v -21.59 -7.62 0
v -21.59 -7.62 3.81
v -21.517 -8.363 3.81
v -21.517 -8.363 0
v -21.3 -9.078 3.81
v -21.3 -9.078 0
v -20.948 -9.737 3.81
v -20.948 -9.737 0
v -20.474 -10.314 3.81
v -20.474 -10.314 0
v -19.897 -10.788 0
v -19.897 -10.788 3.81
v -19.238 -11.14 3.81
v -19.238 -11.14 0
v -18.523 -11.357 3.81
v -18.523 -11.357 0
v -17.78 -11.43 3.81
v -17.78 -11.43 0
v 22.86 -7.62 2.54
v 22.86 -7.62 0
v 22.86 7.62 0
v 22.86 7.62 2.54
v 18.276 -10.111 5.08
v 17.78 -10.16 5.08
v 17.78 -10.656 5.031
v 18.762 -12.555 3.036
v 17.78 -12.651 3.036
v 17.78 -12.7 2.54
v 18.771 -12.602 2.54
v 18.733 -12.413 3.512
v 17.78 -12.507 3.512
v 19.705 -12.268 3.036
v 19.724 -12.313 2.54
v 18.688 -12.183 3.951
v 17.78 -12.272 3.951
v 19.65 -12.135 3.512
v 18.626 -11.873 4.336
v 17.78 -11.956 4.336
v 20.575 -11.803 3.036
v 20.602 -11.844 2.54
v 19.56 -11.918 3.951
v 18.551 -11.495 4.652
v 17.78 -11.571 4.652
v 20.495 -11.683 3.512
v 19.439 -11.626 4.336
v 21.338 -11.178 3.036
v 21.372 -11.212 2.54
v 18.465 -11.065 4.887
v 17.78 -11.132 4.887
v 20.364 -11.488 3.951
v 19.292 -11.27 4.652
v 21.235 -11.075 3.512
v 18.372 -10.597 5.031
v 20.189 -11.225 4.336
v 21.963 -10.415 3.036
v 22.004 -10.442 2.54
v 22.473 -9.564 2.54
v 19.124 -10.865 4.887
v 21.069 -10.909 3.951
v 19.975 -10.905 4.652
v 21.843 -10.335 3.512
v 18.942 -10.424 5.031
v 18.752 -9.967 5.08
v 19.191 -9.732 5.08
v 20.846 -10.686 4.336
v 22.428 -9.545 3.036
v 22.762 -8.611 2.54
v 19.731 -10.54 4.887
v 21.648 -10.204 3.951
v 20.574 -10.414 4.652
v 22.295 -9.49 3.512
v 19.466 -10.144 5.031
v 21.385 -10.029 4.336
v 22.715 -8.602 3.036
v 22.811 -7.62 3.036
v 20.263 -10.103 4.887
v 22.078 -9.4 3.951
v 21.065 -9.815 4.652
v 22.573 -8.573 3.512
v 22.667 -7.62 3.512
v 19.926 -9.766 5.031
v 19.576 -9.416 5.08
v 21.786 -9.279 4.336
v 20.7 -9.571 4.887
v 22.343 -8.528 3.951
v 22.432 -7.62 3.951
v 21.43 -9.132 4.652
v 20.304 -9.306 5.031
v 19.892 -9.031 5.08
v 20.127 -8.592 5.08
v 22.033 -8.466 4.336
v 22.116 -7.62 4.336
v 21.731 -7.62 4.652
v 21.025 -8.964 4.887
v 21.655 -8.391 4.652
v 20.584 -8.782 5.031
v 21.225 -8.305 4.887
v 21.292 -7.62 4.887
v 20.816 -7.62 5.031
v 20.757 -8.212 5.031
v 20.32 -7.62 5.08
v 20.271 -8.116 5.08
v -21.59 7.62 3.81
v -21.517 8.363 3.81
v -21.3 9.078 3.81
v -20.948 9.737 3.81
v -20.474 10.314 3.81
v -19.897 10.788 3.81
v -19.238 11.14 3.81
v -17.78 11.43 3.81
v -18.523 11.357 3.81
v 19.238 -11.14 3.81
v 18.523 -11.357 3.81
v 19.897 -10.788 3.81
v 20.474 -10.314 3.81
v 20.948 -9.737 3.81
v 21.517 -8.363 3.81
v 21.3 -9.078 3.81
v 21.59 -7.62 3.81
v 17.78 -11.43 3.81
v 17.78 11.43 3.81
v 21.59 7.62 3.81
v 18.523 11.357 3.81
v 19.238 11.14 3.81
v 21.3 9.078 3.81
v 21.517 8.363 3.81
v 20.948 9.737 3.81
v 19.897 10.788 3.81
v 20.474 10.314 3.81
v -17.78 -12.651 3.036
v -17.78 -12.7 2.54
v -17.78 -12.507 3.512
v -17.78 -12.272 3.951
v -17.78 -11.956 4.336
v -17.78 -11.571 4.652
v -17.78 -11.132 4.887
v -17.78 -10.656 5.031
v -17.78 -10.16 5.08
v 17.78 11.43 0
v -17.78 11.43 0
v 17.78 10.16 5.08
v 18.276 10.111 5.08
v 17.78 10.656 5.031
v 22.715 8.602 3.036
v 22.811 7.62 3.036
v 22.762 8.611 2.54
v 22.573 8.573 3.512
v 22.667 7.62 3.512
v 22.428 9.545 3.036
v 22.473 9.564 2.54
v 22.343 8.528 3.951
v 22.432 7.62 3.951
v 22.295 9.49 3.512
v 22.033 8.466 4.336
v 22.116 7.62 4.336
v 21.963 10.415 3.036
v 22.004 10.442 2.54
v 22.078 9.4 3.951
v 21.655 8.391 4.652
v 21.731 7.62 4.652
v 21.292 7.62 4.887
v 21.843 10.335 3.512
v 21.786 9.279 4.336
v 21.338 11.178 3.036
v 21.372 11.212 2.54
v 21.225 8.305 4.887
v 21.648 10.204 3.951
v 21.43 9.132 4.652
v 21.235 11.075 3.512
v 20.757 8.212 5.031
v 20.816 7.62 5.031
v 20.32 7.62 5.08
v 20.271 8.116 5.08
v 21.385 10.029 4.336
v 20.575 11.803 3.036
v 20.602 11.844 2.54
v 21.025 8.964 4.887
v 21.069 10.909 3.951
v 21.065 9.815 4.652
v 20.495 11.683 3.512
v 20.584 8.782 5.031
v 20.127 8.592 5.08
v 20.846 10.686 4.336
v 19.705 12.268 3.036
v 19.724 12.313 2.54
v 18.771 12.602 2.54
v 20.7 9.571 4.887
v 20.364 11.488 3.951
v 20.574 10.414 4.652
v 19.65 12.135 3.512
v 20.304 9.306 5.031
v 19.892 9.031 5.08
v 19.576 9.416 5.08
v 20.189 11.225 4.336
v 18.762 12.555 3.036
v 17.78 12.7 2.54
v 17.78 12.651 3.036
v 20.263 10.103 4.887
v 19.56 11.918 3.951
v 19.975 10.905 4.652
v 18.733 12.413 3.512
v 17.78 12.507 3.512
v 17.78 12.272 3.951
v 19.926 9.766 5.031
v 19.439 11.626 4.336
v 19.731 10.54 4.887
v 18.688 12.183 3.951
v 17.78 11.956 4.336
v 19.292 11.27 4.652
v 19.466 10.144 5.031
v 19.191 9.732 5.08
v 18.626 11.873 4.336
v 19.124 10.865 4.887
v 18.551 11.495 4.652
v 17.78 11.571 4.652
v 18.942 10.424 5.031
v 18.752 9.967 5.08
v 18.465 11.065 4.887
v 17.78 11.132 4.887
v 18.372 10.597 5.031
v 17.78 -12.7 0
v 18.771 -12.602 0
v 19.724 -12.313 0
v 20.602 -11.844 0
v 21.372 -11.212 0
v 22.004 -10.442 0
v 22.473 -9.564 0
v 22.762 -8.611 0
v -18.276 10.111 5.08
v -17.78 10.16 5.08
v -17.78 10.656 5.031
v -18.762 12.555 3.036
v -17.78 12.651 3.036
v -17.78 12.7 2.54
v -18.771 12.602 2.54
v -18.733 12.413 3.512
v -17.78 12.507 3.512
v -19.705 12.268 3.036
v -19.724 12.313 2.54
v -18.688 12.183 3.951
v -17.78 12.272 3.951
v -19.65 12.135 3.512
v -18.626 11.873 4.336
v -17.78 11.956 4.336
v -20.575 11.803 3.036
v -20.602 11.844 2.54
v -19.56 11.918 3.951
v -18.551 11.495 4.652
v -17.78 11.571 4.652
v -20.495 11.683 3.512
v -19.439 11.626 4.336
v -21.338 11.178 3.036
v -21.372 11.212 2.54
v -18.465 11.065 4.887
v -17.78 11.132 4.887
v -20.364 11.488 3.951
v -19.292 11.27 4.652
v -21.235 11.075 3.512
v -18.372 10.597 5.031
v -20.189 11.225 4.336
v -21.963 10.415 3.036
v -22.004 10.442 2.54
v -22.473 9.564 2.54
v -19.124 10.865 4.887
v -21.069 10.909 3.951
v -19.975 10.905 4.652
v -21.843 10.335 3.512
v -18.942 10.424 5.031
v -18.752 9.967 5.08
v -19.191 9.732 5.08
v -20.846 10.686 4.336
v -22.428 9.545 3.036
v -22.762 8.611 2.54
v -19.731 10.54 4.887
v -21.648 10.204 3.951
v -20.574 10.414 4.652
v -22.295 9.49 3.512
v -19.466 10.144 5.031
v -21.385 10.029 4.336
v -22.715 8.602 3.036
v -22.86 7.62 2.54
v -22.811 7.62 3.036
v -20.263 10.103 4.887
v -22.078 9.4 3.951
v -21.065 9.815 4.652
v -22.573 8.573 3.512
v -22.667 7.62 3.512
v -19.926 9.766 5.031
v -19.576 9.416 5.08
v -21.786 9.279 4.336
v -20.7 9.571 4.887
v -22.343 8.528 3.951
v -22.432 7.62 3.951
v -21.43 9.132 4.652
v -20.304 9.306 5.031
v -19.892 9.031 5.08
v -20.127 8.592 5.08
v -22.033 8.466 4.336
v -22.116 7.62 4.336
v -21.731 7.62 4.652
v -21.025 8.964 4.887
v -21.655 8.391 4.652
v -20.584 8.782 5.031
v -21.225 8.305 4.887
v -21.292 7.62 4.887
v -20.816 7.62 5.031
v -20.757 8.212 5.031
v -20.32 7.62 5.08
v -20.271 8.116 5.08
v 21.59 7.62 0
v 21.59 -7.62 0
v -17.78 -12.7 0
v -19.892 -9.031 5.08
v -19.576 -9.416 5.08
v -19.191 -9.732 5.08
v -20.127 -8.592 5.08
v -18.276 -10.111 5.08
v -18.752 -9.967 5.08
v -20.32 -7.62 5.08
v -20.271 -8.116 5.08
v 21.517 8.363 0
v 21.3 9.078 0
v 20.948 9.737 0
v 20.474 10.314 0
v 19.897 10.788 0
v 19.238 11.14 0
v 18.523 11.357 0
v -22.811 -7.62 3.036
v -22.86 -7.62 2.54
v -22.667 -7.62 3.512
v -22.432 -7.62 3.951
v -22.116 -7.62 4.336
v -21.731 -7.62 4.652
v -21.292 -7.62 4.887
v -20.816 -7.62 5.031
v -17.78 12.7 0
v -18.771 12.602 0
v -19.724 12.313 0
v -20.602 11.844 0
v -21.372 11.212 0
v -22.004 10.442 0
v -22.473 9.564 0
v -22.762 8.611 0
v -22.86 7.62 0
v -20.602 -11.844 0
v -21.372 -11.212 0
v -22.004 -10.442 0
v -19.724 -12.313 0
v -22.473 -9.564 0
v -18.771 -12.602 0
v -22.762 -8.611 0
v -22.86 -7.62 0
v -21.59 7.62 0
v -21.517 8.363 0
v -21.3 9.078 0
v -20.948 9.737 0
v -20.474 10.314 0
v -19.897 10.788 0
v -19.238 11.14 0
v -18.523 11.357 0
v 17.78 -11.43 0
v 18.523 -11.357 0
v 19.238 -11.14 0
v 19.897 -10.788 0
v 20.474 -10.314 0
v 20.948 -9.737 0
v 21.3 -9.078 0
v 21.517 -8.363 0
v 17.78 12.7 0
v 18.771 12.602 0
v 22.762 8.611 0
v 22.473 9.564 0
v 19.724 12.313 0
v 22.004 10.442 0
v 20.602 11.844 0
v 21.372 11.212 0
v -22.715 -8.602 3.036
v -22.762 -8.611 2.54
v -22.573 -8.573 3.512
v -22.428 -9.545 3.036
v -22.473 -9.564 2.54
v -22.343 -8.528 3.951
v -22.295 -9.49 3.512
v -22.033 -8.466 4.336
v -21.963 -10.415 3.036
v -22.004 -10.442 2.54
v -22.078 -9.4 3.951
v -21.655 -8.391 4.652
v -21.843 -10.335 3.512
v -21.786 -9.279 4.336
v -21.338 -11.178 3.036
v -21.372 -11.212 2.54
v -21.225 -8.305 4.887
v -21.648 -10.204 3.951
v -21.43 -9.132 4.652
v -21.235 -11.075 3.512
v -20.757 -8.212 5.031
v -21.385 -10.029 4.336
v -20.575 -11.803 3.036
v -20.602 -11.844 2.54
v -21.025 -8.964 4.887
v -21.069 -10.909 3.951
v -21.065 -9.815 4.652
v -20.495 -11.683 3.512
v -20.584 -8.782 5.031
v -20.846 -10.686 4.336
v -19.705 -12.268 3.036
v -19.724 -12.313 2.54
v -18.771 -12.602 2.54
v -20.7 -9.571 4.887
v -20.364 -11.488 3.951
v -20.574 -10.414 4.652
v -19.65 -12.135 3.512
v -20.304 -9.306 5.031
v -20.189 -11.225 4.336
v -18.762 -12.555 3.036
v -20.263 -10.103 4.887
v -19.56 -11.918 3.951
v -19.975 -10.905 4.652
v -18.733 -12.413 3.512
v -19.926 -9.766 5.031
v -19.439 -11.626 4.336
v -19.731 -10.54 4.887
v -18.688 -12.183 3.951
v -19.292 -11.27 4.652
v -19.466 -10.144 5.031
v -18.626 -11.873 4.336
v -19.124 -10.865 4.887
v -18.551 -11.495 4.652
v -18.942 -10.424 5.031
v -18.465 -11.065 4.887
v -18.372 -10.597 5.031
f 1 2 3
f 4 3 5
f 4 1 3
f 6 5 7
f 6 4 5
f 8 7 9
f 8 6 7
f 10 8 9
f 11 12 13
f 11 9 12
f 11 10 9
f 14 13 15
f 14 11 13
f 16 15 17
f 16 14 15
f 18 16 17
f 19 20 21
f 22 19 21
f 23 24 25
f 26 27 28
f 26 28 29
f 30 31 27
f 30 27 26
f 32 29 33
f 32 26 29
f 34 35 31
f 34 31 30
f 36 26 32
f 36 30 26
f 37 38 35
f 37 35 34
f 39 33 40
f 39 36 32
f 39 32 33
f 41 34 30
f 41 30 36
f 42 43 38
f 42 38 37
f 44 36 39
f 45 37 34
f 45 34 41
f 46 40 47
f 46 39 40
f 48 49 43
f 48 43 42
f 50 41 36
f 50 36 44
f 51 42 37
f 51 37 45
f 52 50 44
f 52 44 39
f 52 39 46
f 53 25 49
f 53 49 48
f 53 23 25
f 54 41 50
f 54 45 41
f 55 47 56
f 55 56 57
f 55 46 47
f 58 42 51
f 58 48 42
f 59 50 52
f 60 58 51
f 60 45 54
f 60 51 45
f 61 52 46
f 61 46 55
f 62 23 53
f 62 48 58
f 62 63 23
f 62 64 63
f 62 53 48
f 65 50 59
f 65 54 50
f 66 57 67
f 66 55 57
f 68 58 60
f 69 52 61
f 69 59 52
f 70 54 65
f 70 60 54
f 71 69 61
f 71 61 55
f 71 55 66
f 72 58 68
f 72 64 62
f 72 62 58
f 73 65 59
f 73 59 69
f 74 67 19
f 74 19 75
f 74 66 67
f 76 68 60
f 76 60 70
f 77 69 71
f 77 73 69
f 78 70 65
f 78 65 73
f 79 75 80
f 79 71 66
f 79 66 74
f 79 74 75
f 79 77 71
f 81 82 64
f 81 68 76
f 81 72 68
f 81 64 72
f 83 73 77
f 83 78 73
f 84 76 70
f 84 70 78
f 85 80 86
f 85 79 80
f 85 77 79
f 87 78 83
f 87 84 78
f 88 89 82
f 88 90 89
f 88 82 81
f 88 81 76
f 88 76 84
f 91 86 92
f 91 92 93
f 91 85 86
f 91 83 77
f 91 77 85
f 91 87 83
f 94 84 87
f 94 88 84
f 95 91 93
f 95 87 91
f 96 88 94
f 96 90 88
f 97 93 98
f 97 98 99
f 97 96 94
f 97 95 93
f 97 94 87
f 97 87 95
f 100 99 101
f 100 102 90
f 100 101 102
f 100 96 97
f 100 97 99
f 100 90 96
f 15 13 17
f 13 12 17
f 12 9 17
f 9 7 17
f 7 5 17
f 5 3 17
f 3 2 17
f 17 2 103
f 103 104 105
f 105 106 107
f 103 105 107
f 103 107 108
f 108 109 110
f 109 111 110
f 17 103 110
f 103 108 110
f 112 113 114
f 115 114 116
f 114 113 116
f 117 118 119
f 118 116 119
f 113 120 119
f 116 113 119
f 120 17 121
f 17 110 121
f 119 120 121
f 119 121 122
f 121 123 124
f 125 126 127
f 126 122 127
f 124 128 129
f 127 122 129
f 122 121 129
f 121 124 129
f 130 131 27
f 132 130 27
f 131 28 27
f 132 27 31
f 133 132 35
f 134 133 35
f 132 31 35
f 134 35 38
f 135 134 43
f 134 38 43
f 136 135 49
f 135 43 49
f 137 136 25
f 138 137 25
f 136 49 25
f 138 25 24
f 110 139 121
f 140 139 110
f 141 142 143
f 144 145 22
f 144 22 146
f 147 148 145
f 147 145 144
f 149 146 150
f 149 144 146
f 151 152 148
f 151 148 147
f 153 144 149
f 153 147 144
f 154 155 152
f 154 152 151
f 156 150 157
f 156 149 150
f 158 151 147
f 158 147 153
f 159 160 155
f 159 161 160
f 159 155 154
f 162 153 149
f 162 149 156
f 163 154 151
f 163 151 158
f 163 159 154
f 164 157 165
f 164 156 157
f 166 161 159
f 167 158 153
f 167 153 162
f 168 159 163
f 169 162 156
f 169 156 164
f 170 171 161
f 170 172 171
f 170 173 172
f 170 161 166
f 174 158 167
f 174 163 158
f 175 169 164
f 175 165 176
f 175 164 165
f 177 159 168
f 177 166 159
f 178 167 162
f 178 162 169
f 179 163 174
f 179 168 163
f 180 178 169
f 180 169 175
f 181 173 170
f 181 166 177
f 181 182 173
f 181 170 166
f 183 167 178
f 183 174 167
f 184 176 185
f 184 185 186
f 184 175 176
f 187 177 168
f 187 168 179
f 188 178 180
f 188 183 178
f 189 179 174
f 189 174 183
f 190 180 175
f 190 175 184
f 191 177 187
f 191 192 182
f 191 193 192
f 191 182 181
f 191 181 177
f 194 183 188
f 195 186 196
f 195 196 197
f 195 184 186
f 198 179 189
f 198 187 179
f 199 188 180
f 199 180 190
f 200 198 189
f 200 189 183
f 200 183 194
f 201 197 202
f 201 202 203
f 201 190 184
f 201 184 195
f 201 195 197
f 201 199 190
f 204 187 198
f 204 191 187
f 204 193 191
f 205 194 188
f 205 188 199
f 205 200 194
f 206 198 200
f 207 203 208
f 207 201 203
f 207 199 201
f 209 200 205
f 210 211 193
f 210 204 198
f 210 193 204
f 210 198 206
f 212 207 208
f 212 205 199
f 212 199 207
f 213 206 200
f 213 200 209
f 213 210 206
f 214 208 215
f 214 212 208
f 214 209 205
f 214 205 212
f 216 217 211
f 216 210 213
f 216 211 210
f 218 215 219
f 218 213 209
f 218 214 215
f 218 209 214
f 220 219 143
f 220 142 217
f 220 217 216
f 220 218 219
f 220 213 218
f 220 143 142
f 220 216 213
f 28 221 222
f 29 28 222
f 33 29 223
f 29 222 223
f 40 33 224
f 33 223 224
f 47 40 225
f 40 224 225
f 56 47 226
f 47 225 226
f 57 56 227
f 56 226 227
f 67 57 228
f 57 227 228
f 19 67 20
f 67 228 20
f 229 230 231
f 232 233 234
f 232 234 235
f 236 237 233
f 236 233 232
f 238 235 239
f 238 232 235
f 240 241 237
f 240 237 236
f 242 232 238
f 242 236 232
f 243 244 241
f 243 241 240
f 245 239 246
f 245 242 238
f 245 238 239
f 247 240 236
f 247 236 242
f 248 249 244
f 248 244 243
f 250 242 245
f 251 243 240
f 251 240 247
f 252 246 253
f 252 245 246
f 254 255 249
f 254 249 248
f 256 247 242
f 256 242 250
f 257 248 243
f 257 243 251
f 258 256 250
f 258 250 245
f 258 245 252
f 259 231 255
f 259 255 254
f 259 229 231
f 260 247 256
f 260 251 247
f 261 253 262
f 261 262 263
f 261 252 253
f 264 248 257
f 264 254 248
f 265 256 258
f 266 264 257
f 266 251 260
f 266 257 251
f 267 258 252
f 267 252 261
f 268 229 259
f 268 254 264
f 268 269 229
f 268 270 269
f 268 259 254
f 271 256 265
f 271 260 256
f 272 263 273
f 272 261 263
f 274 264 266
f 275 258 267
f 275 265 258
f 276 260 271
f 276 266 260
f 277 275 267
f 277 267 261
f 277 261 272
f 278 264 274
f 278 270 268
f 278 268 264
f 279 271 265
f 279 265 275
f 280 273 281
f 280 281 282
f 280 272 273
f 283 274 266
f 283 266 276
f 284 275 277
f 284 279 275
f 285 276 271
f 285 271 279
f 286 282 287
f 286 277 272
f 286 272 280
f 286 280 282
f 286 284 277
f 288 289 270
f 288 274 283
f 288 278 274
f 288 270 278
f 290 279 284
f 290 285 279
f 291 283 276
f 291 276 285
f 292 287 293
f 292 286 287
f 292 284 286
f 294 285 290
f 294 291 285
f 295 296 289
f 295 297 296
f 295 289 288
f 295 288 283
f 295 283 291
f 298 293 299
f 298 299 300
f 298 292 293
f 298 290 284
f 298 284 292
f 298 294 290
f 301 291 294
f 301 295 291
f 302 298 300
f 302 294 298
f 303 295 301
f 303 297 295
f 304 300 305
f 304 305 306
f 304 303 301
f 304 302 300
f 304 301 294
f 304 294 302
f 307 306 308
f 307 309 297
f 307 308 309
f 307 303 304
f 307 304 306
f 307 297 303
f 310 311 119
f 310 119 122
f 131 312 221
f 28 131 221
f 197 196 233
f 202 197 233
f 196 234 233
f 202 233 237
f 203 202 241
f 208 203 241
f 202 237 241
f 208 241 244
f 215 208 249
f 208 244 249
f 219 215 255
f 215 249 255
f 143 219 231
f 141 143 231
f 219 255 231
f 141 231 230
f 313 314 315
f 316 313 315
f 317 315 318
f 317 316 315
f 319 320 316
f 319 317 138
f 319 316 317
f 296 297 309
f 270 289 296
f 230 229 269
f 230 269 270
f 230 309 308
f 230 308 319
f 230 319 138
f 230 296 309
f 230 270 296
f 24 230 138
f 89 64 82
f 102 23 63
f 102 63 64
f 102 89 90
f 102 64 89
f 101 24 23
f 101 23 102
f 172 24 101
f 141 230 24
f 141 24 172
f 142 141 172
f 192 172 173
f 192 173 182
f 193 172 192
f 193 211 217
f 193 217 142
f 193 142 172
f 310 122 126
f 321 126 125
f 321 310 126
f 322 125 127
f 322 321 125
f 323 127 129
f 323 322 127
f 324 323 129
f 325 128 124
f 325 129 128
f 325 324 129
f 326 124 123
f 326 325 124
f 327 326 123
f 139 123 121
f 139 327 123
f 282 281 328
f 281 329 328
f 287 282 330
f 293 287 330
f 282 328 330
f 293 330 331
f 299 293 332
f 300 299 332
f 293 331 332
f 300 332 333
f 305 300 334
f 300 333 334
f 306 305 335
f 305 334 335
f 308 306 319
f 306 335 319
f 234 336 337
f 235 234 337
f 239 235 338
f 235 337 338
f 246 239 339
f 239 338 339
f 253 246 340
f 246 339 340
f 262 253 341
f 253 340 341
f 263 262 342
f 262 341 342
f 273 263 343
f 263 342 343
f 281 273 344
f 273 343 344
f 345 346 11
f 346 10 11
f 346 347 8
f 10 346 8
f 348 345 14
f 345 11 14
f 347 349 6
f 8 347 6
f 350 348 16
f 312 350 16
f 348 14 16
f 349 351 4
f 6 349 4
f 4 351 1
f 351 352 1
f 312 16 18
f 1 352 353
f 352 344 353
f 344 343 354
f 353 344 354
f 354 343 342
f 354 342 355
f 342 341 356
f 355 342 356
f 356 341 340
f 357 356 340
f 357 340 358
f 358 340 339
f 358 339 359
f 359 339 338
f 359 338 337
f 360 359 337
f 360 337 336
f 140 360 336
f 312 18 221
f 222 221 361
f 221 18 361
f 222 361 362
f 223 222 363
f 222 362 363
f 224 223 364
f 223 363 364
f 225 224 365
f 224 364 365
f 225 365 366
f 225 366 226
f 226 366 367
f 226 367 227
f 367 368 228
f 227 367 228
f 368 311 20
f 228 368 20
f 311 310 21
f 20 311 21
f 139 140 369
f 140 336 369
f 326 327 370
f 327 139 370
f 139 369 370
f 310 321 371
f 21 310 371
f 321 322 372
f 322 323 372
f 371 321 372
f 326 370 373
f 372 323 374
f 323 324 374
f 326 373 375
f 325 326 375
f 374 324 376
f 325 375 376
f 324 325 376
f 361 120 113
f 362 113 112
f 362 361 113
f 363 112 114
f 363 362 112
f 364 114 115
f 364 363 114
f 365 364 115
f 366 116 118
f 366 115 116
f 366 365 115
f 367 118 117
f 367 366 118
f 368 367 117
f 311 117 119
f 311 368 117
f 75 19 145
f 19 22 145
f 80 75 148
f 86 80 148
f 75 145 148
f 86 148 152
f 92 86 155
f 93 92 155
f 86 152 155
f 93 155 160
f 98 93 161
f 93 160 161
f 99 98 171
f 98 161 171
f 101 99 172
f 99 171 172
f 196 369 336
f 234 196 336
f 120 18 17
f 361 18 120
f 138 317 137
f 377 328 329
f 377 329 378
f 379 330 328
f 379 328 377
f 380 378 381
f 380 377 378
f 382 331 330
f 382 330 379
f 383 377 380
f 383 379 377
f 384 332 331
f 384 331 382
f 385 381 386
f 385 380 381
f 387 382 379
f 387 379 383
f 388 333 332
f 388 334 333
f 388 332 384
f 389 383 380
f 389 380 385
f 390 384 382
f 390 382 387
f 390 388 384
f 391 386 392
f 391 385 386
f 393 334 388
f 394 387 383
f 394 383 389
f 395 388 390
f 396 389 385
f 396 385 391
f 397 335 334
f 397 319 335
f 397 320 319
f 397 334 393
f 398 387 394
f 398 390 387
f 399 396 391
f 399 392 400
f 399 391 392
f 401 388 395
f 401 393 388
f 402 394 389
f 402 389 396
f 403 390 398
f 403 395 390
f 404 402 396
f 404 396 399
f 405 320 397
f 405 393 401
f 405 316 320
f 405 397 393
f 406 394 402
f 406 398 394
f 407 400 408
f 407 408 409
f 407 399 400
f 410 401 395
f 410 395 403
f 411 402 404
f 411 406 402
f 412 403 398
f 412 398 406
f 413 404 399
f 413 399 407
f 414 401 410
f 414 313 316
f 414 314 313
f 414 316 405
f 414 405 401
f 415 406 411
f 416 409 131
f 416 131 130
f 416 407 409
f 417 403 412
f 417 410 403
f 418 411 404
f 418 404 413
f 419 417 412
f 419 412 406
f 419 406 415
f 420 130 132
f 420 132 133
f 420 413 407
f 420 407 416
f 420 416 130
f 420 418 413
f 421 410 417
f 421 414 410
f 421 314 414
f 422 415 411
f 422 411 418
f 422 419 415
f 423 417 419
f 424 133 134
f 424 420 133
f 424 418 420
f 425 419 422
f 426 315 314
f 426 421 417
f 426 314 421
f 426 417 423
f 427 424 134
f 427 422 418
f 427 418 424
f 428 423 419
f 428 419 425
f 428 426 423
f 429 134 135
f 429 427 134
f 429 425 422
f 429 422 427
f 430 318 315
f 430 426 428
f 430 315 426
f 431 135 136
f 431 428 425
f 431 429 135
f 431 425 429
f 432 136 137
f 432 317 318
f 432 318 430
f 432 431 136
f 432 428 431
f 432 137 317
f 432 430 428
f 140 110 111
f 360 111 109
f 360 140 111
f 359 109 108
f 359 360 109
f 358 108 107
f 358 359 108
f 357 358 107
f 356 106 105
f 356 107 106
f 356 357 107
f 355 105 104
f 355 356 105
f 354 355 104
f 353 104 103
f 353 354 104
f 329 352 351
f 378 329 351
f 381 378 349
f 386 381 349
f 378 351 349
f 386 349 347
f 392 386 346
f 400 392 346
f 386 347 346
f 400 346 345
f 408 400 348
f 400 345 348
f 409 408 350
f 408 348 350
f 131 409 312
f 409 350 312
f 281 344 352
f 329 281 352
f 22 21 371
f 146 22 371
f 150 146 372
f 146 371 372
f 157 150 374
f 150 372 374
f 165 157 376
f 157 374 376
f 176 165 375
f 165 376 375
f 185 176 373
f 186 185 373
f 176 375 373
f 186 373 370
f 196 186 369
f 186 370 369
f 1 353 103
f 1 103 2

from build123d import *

# Parameters (mm, degrees)
F1_DEPTH = 5.08
F2_T     = -1.27
F3_R     = 2.54


with BuildPart() as f1:
    # F0 (on Top) → F1 (new body)
    with BuildSketch(Plane.XY):
        with BuildLine():
            ThreePointArc((22.86, 7.62), (21.372102, 11.212102), (17.78, 12.7))
            Line((17.78, 12.7), (-17.78, 12.7))
            ThreePointArc((-17.78, 12.7), (-21.372102, 11.212102), (-22.86, 7.62))
            Line((-22.86, 7.62), (-22.86, -7.62))
            ThreePointArc((-22.86, -7.62), (-21.372102, -11.212102), (-17.78, -12.7))
            Line((-17.78, -12.7), (17.78, -12.7))
            ThreePointArc((17.78, -12.7), (21.372102, -11.212102), (22.86, -7.62))
            Line((22.86, -7.62), (22.86, 7.62))
        make_face()
    extrude(amount=F1_DEPTH)

    # F2
    f2_openings = [f1.faces().sort_by_distance(p)[0] for p in [
        (0, 0, 0),
    ]]
    offset(amount=F2_T, openings=f2_openings)

    # F3
    f3_edges = [f1.edges().sort_by_distance(p)[0] for p in [
        (0, 12.7, 5.08),
    ]]
    fillet(f3_edges, radius=F3_R)


solid = f1.part
